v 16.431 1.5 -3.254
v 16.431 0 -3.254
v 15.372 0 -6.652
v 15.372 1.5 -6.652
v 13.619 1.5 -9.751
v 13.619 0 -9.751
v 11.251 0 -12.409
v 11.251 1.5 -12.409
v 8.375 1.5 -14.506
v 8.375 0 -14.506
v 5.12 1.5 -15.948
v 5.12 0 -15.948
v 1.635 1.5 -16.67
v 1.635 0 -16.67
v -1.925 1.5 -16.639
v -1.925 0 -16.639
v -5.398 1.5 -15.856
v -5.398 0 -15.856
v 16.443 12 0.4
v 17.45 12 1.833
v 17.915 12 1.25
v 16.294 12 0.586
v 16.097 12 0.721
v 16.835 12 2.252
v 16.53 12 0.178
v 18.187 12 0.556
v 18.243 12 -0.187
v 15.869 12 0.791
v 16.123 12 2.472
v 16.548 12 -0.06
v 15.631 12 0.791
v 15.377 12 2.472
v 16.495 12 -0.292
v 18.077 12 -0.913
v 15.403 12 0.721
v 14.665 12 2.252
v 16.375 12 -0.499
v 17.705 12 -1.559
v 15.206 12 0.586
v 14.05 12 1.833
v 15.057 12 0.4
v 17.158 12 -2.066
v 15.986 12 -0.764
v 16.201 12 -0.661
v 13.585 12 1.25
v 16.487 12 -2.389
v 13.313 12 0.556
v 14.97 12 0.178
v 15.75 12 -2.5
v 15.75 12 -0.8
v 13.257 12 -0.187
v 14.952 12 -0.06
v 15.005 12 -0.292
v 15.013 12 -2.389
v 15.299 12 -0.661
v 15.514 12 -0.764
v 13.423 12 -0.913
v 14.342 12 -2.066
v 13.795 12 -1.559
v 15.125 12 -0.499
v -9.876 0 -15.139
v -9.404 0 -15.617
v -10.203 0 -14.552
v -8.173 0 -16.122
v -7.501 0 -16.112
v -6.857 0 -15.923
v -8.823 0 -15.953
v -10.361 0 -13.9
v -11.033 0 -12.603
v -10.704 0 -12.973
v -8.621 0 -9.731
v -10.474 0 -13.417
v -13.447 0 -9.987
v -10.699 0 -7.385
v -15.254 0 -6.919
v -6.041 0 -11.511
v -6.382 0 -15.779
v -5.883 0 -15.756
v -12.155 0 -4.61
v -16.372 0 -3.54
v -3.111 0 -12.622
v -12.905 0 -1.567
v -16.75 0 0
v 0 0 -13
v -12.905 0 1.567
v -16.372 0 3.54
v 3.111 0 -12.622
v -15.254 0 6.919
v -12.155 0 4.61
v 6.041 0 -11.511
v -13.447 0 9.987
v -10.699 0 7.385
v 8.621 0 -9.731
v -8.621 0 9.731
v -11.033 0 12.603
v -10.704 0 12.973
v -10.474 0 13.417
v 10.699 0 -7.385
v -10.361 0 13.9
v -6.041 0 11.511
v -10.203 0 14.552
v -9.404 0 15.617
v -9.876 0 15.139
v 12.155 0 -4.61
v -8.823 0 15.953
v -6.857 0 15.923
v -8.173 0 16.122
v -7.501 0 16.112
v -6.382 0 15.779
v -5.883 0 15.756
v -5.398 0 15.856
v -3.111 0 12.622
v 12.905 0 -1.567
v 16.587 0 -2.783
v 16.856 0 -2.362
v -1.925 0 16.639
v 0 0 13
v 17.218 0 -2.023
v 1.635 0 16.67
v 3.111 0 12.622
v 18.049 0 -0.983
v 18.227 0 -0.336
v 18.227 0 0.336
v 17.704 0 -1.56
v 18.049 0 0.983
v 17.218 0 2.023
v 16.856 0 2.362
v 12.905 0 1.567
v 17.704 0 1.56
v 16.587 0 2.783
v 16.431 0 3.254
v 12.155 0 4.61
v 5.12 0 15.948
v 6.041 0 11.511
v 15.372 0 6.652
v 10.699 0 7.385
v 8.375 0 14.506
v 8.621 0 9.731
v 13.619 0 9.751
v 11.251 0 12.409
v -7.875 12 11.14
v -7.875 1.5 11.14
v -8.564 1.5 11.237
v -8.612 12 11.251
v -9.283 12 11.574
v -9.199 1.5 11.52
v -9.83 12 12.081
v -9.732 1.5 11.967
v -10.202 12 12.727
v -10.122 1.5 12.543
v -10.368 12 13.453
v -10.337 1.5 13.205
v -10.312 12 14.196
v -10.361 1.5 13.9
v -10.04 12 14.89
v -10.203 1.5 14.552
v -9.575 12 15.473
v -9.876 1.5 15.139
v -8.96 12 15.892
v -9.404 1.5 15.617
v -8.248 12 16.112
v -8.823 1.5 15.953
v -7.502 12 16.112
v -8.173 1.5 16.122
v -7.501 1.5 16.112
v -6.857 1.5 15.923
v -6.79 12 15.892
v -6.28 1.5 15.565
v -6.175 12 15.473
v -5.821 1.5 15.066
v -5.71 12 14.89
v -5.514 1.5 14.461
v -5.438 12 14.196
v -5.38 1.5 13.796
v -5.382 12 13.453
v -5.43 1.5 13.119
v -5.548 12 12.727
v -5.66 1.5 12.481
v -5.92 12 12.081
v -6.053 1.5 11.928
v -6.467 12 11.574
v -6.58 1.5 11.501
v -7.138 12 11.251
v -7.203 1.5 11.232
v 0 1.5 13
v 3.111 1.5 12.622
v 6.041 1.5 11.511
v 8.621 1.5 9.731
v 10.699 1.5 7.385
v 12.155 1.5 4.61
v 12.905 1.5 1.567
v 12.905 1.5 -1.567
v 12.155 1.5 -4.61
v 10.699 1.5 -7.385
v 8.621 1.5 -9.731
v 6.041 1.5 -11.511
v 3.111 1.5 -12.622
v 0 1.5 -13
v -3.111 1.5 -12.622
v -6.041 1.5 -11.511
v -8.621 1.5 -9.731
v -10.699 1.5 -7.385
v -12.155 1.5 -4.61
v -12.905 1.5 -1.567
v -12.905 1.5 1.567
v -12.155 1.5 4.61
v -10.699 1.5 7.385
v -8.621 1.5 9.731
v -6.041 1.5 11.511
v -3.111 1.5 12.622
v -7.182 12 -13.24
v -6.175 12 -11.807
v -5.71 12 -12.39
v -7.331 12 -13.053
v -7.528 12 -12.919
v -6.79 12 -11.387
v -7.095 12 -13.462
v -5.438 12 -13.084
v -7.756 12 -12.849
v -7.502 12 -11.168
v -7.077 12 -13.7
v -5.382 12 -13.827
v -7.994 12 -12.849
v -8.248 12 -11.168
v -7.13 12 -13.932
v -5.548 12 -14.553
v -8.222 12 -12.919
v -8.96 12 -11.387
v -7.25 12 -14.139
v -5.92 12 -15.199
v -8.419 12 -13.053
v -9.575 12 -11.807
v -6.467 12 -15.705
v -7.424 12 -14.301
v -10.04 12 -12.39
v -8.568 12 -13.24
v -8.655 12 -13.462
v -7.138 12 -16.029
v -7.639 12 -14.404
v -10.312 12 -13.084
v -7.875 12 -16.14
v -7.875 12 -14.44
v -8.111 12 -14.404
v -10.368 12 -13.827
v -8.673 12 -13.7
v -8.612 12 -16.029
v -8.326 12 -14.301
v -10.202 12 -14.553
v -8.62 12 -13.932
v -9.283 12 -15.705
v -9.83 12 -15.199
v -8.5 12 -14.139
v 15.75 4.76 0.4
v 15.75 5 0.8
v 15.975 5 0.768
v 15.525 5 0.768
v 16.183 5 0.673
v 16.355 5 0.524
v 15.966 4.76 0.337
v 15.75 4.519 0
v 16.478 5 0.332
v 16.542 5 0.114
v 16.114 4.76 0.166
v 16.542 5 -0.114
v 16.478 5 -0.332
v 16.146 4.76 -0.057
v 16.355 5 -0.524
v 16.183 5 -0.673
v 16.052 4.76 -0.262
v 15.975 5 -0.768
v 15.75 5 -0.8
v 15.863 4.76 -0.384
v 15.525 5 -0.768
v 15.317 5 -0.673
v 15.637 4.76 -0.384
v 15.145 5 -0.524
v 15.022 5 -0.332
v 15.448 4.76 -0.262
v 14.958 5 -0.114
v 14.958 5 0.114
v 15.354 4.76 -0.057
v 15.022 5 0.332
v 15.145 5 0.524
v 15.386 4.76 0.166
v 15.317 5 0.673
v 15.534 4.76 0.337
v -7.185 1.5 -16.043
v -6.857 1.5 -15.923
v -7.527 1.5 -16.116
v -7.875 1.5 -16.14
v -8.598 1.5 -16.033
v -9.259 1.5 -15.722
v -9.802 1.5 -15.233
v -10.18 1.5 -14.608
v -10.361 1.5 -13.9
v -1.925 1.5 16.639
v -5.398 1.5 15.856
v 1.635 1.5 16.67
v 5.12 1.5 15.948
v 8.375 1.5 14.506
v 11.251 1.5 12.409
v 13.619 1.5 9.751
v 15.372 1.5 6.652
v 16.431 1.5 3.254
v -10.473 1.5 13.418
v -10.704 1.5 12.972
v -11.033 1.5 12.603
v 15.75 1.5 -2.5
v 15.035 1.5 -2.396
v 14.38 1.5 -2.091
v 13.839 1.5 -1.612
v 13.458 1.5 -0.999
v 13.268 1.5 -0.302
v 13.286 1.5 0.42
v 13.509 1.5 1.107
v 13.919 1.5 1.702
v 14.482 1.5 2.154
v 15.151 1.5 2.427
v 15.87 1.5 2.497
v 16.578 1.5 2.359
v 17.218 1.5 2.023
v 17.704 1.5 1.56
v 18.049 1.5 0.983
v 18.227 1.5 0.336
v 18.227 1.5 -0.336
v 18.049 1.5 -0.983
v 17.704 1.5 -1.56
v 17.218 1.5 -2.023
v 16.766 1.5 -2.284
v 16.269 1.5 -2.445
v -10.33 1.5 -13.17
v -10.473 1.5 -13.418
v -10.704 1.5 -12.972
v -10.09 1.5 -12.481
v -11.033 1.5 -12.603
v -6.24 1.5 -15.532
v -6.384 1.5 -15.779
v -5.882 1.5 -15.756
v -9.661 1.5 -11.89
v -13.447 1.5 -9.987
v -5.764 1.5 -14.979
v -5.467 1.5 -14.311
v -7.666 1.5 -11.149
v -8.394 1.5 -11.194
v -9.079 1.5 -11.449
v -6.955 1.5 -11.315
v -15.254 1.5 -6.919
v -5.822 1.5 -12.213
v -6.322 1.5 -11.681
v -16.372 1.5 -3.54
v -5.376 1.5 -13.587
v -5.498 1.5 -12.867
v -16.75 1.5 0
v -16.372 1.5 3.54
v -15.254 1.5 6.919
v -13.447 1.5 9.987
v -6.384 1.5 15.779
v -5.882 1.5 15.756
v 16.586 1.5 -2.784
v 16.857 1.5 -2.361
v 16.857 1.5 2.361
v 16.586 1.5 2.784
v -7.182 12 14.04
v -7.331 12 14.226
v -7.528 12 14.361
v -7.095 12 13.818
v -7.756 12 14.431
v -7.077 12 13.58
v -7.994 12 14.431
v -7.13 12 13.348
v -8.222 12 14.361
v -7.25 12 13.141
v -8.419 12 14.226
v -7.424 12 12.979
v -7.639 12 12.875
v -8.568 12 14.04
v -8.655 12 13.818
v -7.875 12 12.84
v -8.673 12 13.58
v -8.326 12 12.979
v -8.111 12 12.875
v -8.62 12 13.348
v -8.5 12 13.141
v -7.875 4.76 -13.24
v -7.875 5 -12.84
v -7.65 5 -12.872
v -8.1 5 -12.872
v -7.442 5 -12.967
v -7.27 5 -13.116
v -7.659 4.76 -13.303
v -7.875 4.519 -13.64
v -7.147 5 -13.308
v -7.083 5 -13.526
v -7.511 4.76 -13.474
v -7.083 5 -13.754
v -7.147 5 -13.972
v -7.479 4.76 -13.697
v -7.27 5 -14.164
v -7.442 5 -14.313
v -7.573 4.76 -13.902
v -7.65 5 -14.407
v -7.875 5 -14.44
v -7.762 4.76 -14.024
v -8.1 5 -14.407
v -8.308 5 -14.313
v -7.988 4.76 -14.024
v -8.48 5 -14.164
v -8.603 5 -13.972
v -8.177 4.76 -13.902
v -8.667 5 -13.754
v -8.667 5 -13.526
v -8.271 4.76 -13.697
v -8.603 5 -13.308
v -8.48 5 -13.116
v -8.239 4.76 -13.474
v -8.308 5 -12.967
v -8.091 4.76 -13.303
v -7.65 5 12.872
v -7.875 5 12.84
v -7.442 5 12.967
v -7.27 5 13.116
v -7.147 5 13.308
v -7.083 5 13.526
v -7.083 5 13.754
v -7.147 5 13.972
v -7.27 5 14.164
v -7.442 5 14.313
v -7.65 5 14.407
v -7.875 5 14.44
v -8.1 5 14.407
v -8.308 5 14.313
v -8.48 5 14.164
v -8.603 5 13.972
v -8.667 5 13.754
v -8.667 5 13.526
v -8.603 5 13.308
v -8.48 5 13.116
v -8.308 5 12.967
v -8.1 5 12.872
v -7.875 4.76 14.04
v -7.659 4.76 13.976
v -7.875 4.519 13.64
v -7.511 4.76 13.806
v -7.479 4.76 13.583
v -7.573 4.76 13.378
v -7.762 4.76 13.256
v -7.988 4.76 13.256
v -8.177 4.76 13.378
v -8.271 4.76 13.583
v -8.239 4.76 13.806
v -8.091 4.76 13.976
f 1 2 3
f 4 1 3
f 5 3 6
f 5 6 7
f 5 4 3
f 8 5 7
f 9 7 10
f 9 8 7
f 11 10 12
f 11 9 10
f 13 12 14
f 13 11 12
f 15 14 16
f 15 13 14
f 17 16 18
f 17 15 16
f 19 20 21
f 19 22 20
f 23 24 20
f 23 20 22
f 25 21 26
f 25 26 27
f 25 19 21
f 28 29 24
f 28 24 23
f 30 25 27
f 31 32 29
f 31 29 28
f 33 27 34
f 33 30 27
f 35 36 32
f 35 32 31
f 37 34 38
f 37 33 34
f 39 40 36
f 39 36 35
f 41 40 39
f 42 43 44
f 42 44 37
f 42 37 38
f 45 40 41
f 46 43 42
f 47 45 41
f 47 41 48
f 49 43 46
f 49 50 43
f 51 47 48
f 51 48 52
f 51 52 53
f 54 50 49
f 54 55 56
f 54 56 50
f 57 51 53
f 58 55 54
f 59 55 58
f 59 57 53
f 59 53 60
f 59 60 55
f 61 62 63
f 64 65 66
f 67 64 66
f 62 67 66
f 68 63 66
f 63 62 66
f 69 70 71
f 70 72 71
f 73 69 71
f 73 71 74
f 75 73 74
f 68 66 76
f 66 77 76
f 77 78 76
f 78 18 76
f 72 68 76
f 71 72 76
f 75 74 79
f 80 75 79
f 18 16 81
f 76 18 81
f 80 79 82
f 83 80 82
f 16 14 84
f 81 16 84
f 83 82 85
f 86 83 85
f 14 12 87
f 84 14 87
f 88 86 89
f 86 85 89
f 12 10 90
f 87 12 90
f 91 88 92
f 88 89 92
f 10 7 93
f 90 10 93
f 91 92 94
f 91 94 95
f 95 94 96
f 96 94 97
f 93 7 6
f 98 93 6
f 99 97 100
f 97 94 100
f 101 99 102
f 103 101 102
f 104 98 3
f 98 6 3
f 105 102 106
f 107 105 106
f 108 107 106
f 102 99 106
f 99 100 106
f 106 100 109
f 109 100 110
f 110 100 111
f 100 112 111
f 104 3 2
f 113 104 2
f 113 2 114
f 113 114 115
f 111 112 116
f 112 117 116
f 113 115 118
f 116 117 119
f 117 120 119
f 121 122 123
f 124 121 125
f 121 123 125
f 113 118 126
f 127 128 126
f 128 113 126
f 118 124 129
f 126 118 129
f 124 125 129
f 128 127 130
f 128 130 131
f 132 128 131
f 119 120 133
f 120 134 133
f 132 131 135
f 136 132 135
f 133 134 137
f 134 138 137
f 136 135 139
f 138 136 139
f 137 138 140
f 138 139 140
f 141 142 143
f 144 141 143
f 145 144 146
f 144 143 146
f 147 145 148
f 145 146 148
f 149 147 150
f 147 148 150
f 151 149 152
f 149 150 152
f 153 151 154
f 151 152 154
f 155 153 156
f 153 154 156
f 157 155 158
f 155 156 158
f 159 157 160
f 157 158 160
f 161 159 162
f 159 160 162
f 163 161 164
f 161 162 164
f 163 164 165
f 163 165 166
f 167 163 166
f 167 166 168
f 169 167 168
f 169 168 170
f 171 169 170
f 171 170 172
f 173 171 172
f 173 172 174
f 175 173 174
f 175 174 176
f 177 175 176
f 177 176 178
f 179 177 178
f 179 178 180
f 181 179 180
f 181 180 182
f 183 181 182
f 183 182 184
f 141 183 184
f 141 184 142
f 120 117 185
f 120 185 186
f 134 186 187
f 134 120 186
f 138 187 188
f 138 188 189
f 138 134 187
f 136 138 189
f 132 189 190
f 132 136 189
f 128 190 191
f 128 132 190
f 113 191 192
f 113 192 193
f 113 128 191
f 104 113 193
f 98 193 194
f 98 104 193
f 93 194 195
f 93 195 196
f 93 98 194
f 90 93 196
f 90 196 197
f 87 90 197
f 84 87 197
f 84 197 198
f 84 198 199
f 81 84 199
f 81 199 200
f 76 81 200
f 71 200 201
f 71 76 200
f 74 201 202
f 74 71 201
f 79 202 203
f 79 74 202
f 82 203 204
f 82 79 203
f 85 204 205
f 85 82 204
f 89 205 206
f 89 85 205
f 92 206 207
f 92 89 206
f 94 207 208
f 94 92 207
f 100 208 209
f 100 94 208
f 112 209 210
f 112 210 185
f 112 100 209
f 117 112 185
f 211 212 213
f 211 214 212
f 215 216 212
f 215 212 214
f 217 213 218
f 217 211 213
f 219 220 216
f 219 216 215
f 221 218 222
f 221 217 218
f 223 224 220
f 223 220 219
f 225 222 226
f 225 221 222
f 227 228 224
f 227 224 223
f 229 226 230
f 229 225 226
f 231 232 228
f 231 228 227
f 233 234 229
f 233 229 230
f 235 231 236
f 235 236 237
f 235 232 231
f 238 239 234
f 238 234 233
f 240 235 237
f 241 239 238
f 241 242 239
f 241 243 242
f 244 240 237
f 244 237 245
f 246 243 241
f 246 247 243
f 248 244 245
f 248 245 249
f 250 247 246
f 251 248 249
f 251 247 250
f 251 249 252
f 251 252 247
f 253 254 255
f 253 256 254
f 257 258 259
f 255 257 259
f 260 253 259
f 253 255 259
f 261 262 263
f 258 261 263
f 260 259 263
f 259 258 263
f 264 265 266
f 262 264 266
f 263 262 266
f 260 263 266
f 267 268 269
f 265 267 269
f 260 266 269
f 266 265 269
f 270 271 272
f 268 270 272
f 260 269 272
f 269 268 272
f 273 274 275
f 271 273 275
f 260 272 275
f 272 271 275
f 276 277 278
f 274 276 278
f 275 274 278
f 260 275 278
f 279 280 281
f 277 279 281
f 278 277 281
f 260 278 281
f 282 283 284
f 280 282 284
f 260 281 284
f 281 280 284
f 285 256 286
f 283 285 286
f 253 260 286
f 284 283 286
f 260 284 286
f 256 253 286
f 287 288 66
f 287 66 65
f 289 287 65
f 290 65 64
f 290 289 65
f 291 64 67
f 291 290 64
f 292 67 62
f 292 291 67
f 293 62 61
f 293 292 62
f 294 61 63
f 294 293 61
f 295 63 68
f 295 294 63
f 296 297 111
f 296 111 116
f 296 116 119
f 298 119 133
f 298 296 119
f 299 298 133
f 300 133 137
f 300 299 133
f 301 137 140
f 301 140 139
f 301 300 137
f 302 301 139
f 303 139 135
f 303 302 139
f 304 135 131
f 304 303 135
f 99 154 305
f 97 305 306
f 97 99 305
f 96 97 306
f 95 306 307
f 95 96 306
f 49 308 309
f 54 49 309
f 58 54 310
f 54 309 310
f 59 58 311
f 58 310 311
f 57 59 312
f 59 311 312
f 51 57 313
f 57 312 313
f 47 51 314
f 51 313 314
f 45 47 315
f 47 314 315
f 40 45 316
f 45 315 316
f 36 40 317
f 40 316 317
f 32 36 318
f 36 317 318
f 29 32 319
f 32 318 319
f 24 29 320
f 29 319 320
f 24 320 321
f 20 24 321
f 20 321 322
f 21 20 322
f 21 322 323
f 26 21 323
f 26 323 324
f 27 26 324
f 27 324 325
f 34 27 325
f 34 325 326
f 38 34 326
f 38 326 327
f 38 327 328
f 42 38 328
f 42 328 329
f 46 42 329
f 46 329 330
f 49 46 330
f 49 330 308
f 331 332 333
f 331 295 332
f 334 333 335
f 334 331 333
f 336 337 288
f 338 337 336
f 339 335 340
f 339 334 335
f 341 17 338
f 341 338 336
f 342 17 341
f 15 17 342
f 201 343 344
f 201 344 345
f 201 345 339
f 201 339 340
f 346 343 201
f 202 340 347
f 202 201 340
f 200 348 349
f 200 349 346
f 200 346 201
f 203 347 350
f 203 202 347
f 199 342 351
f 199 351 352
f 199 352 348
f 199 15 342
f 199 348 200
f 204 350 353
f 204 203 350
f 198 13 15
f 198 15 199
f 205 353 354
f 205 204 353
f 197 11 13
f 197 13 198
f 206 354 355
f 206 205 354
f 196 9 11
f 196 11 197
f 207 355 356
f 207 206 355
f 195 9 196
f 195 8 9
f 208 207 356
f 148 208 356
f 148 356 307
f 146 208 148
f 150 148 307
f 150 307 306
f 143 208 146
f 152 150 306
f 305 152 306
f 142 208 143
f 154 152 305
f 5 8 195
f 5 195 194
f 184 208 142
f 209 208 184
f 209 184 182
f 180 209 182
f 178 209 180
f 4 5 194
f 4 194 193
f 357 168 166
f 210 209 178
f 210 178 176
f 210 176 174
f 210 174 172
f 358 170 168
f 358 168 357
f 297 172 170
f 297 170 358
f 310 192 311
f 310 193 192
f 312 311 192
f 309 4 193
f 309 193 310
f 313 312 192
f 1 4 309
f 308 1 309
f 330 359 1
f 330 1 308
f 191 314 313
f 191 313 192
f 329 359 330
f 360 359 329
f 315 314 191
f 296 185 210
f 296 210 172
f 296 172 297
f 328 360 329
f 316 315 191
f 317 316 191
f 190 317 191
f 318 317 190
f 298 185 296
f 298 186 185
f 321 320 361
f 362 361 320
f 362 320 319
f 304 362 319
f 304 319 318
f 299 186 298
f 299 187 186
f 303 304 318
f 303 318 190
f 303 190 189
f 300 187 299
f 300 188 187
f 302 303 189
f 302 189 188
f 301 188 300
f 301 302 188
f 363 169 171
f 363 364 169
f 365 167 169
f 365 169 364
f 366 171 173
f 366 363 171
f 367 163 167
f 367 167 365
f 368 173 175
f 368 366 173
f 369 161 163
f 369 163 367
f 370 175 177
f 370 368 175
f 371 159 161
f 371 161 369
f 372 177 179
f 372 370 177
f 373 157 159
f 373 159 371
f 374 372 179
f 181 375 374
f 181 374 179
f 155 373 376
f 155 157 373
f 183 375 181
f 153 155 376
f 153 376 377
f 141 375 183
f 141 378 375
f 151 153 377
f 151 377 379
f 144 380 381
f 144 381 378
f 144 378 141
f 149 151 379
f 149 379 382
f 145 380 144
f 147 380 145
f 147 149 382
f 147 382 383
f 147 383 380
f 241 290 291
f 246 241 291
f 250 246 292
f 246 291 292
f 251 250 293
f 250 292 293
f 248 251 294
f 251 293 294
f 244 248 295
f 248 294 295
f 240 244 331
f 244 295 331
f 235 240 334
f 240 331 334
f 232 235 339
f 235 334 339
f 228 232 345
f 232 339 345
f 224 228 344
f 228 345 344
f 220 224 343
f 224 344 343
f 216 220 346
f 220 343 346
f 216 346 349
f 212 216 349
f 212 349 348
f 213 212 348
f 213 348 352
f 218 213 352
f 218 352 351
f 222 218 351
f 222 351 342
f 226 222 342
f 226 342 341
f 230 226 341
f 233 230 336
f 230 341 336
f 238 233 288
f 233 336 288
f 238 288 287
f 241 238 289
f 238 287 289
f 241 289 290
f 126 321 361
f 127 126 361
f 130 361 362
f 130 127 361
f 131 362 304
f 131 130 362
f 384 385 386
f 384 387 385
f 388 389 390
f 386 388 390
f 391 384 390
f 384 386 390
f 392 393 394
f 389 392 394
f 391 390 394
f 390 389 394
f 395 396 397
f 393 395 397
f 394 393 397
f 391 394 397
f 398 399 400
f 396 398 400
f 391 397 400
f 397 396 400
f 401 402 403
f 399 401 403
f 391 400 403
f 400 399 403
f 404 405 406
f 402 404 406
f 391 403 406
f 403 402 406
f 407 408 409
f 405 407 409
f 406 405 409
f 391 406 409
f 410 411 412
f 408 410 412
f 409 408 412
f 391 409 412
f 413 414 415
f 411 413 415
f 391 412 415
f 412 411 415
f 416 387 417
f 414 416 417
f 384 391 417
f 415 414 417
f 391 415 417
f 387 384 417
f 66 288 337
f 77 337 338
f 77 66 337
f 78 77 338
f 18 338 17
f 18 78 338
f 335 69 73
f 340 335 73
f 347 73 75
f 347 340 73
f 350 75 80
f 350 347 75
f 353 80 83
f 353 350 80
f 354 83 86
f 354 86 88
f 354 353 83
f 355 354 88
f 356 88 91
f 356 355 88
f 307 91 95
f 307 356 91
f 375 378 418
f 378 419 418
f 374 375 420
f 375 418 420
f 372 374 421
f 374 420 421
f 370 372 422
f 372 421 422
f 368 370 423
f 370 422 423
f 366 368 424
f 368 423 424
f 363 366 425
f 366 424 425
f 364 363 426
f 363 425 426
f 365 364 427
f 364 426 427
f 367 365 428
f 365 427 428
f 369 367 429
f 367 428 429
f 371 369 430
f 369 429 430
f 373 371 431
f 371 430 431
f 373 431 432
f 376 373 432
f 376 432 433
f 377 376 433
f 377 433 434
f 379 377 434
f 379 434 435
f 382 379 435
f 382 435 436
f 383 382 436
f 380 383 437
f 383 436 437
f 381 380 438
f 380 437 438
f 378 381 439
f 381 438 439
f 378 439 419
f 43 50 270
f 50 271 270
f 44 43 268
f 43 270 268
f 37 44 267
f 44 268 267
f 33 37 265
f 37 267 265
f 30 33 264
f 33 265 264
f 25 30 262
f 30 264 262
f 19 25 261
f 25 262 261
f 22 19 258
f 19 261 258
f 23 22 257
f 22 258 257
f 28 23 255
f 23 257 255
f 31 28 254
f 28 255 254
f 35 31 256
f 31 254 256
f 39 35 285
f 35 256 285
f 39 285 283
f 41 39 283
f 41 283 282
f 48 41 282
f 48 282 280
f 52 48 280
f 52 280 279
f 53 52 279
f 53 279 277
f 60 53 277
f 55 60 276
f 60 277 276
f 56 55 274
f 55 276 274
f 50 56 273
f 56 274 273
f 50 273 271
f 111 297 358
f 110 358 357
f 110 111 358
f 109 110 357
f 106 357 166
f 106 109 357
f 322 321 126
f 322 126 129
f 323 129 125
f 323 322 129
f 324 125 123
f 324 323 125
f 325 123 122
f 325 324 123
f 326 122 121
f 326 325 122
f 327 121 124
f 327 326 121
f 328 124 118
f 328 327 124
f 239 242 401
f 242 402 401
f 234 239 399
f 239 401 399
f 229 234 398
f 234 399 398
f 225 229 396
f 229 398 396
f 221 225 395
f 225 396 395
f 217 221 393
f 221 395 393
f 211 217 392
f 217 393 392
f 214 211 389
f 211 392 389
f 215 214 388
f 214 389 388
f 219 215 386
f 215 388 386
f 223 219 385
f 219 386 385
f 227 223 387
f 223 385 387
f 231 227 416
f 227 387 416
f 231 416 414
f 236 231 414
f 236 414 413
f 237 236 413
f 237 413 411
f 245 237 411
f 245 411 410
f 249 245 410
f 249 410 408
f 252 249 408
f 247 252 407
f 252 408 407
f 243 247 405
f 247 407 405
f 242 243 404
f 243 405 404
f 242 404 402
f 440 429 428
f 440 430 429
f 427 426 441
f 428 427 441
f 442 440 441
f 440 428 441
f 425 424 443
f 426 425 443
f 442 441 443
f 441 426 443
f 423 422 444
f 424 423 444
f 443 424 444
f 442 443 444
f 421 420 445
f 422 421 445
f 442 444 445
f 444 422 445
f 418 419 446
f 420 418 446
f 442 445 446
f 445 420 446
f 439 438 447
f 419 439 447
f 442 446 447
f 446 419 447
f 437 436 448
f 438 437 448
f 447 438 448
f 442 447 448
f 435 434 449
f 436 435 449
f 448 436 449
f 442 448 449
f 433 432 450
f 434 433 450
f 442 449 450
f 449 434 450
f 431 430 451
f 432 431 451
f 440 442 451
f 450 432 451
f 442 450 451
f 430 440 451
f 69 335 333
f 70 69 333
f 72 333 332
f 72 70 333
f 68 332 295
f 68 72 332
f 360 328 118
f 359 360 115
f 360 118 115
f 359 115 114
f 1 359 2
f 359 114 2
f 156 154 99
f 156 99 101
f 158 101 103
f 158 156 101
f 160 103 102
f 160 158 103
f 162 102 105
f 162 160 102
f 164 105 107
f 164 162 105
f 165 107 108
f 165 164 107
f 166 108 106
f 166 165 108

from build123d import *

# Parameters (mm, degrees)
SKETCH_1_R             = 18.5
SKETCH_1_R_2           = 13
EXTRUDE_1_DEPTH        = 1.5
SKETCH_2_R             = 2.5
EXTRUDE_2_DEPTH        = 10.5
HOLE_WIZARD_M2_1_D     = 1.6
HOLE_WIZARD_M2_1_DEPTH = 7
HOLE_WIZARD_M2_1_TIP   = 0.480688495
SKETCH_4_OUTSIDE_W     = 49.736
SKETCH_4_OUTSIDE_H     = 49.736
CUT_EXTRUDE_1_DEPTH    = 10
FILLET_1_R             = 2


with BuildPart() as part:
    # 草图1 → 凸台-拉伸1 (new body)
    with BuildSketch(Plane(origin=(0, 0, 0), x_dir=(1, 0, 0), z_dir=(0, 1, 0))):
        with Locations(Location((0, 0, 0), (0, 0, 270))):
            Circle(SKETCH_1_R)
        with Locations(Location((0, 0, 0), (0, 0, 270))):
            Circle(SKETCH_1_R_2, mode=Mode.SUBTRACT)
    extrude(amount=EXTRUDE_1_DEPTH)

    # 草图2 → 凸台-拉伸2 (add)
    with BuildSketch(Plane(origin=(0, 1.5, 0), x_dir=(1, 0, 0), z_dir=(0, 1, 0))):
        with Locations(Location((15.75, 0, 0), (0, 0, 90))):
            Circle(SKETCH_2_R)
        with Locations(Location((-7.875, -13.63990011, 0), (0, 0, 90))):
            Circle(SKETCH_2_R)
        with Locations(Location((-7.875, 13.63990011, 0), (0, 0, 90))):
            Circle(SKETCH_2_R)
    extrude(amount=EXTRUDE_2_DEPTH)

    # M2 螺纹孔1
    with Locations(Plane(origin=(15.75, 12, 0), x_dir=(0, 0, 1), z_dir=(0, 1, 0))):
        with Locations((0, 0), (-13.63990011, -23.625), (13.63990011, -23.625)):
            Hole(HOLE_WIZARD_M2_1_D / 2, depth=HOLE_WIZARD_M2_1_DEPTH)
            with Locations((0, 0, -(HOLE_WIZARD_M2_1_DEPTH + HOLE_WIZARD_M2_1_TIP / 2))):  # 118° drill point
                Cone(0, HOLE_WIZARD_M2_1_D / 2, HOLE_WIZARD_M2_1_TIP, mode=Mode.SUBTRACT)

    # 草图4 outside → 切除-拉伸1 (cut)
    with BuildSketch(Plane(origin=(0, 1.5, 0), x_dir=(1, 0, 0), z_dir=(0, 1, 0))):
        Rectangle(SKETCH_4_OUTSIDE_W, SKETCH_4_OUTSIDE_H)
        with BuildLine():
            ThreePointArc((16.583333333, 2.357022604), (8.375, 14.505925513), (-6.250425214, 15.540099248))
            ThreePointArc((-6.250425214, 15.540099248), (-9.125, 15.804963619), (-10.332908119, 13.183076644))
            ThreePointArc((-10.332908119, 13.183076644), (-16.75, 0), (-10.332908119, -13.183076644))
            ThreePointArc((-10.332908119, -13.183076644), (-9.125, -15.804963619), (-6.250425214, -15.540099248))
            ThreePointArc((-6.250425214, -15.540099248), (8.375, -14.505925513), (16.583333333, -2.357022604))
            ThreePointArc((16.583333333, -2.357022604), (18.25, 0), (16.583333333, 2.357022604))
        make_face(mode=Mode.SUBTRACT)
    extrude(amount=-CUT_EXTRUDE_1_DEPTH, mode=Mode.SUBTRACT)

    # 圆角1
    fillet_1_edges = [part.edges().sort_by_distance(p)[0] for p in [
        (-6.250425214, 0.75, 15.540099248),
        (-10.332908119, 0.75, 13.183076644),
        (-10.332908119, 0.75, -13.183076644),
        (-6.250425214, 0.75, -15.540099248),
        (16.583333333, 0.75, -2.357022604),
        (16.583333333, 0.75, 2.357022604),
    ]]
    fillet(fillet_1_edges, radius=FILLET_1_R)


solid = part.part
